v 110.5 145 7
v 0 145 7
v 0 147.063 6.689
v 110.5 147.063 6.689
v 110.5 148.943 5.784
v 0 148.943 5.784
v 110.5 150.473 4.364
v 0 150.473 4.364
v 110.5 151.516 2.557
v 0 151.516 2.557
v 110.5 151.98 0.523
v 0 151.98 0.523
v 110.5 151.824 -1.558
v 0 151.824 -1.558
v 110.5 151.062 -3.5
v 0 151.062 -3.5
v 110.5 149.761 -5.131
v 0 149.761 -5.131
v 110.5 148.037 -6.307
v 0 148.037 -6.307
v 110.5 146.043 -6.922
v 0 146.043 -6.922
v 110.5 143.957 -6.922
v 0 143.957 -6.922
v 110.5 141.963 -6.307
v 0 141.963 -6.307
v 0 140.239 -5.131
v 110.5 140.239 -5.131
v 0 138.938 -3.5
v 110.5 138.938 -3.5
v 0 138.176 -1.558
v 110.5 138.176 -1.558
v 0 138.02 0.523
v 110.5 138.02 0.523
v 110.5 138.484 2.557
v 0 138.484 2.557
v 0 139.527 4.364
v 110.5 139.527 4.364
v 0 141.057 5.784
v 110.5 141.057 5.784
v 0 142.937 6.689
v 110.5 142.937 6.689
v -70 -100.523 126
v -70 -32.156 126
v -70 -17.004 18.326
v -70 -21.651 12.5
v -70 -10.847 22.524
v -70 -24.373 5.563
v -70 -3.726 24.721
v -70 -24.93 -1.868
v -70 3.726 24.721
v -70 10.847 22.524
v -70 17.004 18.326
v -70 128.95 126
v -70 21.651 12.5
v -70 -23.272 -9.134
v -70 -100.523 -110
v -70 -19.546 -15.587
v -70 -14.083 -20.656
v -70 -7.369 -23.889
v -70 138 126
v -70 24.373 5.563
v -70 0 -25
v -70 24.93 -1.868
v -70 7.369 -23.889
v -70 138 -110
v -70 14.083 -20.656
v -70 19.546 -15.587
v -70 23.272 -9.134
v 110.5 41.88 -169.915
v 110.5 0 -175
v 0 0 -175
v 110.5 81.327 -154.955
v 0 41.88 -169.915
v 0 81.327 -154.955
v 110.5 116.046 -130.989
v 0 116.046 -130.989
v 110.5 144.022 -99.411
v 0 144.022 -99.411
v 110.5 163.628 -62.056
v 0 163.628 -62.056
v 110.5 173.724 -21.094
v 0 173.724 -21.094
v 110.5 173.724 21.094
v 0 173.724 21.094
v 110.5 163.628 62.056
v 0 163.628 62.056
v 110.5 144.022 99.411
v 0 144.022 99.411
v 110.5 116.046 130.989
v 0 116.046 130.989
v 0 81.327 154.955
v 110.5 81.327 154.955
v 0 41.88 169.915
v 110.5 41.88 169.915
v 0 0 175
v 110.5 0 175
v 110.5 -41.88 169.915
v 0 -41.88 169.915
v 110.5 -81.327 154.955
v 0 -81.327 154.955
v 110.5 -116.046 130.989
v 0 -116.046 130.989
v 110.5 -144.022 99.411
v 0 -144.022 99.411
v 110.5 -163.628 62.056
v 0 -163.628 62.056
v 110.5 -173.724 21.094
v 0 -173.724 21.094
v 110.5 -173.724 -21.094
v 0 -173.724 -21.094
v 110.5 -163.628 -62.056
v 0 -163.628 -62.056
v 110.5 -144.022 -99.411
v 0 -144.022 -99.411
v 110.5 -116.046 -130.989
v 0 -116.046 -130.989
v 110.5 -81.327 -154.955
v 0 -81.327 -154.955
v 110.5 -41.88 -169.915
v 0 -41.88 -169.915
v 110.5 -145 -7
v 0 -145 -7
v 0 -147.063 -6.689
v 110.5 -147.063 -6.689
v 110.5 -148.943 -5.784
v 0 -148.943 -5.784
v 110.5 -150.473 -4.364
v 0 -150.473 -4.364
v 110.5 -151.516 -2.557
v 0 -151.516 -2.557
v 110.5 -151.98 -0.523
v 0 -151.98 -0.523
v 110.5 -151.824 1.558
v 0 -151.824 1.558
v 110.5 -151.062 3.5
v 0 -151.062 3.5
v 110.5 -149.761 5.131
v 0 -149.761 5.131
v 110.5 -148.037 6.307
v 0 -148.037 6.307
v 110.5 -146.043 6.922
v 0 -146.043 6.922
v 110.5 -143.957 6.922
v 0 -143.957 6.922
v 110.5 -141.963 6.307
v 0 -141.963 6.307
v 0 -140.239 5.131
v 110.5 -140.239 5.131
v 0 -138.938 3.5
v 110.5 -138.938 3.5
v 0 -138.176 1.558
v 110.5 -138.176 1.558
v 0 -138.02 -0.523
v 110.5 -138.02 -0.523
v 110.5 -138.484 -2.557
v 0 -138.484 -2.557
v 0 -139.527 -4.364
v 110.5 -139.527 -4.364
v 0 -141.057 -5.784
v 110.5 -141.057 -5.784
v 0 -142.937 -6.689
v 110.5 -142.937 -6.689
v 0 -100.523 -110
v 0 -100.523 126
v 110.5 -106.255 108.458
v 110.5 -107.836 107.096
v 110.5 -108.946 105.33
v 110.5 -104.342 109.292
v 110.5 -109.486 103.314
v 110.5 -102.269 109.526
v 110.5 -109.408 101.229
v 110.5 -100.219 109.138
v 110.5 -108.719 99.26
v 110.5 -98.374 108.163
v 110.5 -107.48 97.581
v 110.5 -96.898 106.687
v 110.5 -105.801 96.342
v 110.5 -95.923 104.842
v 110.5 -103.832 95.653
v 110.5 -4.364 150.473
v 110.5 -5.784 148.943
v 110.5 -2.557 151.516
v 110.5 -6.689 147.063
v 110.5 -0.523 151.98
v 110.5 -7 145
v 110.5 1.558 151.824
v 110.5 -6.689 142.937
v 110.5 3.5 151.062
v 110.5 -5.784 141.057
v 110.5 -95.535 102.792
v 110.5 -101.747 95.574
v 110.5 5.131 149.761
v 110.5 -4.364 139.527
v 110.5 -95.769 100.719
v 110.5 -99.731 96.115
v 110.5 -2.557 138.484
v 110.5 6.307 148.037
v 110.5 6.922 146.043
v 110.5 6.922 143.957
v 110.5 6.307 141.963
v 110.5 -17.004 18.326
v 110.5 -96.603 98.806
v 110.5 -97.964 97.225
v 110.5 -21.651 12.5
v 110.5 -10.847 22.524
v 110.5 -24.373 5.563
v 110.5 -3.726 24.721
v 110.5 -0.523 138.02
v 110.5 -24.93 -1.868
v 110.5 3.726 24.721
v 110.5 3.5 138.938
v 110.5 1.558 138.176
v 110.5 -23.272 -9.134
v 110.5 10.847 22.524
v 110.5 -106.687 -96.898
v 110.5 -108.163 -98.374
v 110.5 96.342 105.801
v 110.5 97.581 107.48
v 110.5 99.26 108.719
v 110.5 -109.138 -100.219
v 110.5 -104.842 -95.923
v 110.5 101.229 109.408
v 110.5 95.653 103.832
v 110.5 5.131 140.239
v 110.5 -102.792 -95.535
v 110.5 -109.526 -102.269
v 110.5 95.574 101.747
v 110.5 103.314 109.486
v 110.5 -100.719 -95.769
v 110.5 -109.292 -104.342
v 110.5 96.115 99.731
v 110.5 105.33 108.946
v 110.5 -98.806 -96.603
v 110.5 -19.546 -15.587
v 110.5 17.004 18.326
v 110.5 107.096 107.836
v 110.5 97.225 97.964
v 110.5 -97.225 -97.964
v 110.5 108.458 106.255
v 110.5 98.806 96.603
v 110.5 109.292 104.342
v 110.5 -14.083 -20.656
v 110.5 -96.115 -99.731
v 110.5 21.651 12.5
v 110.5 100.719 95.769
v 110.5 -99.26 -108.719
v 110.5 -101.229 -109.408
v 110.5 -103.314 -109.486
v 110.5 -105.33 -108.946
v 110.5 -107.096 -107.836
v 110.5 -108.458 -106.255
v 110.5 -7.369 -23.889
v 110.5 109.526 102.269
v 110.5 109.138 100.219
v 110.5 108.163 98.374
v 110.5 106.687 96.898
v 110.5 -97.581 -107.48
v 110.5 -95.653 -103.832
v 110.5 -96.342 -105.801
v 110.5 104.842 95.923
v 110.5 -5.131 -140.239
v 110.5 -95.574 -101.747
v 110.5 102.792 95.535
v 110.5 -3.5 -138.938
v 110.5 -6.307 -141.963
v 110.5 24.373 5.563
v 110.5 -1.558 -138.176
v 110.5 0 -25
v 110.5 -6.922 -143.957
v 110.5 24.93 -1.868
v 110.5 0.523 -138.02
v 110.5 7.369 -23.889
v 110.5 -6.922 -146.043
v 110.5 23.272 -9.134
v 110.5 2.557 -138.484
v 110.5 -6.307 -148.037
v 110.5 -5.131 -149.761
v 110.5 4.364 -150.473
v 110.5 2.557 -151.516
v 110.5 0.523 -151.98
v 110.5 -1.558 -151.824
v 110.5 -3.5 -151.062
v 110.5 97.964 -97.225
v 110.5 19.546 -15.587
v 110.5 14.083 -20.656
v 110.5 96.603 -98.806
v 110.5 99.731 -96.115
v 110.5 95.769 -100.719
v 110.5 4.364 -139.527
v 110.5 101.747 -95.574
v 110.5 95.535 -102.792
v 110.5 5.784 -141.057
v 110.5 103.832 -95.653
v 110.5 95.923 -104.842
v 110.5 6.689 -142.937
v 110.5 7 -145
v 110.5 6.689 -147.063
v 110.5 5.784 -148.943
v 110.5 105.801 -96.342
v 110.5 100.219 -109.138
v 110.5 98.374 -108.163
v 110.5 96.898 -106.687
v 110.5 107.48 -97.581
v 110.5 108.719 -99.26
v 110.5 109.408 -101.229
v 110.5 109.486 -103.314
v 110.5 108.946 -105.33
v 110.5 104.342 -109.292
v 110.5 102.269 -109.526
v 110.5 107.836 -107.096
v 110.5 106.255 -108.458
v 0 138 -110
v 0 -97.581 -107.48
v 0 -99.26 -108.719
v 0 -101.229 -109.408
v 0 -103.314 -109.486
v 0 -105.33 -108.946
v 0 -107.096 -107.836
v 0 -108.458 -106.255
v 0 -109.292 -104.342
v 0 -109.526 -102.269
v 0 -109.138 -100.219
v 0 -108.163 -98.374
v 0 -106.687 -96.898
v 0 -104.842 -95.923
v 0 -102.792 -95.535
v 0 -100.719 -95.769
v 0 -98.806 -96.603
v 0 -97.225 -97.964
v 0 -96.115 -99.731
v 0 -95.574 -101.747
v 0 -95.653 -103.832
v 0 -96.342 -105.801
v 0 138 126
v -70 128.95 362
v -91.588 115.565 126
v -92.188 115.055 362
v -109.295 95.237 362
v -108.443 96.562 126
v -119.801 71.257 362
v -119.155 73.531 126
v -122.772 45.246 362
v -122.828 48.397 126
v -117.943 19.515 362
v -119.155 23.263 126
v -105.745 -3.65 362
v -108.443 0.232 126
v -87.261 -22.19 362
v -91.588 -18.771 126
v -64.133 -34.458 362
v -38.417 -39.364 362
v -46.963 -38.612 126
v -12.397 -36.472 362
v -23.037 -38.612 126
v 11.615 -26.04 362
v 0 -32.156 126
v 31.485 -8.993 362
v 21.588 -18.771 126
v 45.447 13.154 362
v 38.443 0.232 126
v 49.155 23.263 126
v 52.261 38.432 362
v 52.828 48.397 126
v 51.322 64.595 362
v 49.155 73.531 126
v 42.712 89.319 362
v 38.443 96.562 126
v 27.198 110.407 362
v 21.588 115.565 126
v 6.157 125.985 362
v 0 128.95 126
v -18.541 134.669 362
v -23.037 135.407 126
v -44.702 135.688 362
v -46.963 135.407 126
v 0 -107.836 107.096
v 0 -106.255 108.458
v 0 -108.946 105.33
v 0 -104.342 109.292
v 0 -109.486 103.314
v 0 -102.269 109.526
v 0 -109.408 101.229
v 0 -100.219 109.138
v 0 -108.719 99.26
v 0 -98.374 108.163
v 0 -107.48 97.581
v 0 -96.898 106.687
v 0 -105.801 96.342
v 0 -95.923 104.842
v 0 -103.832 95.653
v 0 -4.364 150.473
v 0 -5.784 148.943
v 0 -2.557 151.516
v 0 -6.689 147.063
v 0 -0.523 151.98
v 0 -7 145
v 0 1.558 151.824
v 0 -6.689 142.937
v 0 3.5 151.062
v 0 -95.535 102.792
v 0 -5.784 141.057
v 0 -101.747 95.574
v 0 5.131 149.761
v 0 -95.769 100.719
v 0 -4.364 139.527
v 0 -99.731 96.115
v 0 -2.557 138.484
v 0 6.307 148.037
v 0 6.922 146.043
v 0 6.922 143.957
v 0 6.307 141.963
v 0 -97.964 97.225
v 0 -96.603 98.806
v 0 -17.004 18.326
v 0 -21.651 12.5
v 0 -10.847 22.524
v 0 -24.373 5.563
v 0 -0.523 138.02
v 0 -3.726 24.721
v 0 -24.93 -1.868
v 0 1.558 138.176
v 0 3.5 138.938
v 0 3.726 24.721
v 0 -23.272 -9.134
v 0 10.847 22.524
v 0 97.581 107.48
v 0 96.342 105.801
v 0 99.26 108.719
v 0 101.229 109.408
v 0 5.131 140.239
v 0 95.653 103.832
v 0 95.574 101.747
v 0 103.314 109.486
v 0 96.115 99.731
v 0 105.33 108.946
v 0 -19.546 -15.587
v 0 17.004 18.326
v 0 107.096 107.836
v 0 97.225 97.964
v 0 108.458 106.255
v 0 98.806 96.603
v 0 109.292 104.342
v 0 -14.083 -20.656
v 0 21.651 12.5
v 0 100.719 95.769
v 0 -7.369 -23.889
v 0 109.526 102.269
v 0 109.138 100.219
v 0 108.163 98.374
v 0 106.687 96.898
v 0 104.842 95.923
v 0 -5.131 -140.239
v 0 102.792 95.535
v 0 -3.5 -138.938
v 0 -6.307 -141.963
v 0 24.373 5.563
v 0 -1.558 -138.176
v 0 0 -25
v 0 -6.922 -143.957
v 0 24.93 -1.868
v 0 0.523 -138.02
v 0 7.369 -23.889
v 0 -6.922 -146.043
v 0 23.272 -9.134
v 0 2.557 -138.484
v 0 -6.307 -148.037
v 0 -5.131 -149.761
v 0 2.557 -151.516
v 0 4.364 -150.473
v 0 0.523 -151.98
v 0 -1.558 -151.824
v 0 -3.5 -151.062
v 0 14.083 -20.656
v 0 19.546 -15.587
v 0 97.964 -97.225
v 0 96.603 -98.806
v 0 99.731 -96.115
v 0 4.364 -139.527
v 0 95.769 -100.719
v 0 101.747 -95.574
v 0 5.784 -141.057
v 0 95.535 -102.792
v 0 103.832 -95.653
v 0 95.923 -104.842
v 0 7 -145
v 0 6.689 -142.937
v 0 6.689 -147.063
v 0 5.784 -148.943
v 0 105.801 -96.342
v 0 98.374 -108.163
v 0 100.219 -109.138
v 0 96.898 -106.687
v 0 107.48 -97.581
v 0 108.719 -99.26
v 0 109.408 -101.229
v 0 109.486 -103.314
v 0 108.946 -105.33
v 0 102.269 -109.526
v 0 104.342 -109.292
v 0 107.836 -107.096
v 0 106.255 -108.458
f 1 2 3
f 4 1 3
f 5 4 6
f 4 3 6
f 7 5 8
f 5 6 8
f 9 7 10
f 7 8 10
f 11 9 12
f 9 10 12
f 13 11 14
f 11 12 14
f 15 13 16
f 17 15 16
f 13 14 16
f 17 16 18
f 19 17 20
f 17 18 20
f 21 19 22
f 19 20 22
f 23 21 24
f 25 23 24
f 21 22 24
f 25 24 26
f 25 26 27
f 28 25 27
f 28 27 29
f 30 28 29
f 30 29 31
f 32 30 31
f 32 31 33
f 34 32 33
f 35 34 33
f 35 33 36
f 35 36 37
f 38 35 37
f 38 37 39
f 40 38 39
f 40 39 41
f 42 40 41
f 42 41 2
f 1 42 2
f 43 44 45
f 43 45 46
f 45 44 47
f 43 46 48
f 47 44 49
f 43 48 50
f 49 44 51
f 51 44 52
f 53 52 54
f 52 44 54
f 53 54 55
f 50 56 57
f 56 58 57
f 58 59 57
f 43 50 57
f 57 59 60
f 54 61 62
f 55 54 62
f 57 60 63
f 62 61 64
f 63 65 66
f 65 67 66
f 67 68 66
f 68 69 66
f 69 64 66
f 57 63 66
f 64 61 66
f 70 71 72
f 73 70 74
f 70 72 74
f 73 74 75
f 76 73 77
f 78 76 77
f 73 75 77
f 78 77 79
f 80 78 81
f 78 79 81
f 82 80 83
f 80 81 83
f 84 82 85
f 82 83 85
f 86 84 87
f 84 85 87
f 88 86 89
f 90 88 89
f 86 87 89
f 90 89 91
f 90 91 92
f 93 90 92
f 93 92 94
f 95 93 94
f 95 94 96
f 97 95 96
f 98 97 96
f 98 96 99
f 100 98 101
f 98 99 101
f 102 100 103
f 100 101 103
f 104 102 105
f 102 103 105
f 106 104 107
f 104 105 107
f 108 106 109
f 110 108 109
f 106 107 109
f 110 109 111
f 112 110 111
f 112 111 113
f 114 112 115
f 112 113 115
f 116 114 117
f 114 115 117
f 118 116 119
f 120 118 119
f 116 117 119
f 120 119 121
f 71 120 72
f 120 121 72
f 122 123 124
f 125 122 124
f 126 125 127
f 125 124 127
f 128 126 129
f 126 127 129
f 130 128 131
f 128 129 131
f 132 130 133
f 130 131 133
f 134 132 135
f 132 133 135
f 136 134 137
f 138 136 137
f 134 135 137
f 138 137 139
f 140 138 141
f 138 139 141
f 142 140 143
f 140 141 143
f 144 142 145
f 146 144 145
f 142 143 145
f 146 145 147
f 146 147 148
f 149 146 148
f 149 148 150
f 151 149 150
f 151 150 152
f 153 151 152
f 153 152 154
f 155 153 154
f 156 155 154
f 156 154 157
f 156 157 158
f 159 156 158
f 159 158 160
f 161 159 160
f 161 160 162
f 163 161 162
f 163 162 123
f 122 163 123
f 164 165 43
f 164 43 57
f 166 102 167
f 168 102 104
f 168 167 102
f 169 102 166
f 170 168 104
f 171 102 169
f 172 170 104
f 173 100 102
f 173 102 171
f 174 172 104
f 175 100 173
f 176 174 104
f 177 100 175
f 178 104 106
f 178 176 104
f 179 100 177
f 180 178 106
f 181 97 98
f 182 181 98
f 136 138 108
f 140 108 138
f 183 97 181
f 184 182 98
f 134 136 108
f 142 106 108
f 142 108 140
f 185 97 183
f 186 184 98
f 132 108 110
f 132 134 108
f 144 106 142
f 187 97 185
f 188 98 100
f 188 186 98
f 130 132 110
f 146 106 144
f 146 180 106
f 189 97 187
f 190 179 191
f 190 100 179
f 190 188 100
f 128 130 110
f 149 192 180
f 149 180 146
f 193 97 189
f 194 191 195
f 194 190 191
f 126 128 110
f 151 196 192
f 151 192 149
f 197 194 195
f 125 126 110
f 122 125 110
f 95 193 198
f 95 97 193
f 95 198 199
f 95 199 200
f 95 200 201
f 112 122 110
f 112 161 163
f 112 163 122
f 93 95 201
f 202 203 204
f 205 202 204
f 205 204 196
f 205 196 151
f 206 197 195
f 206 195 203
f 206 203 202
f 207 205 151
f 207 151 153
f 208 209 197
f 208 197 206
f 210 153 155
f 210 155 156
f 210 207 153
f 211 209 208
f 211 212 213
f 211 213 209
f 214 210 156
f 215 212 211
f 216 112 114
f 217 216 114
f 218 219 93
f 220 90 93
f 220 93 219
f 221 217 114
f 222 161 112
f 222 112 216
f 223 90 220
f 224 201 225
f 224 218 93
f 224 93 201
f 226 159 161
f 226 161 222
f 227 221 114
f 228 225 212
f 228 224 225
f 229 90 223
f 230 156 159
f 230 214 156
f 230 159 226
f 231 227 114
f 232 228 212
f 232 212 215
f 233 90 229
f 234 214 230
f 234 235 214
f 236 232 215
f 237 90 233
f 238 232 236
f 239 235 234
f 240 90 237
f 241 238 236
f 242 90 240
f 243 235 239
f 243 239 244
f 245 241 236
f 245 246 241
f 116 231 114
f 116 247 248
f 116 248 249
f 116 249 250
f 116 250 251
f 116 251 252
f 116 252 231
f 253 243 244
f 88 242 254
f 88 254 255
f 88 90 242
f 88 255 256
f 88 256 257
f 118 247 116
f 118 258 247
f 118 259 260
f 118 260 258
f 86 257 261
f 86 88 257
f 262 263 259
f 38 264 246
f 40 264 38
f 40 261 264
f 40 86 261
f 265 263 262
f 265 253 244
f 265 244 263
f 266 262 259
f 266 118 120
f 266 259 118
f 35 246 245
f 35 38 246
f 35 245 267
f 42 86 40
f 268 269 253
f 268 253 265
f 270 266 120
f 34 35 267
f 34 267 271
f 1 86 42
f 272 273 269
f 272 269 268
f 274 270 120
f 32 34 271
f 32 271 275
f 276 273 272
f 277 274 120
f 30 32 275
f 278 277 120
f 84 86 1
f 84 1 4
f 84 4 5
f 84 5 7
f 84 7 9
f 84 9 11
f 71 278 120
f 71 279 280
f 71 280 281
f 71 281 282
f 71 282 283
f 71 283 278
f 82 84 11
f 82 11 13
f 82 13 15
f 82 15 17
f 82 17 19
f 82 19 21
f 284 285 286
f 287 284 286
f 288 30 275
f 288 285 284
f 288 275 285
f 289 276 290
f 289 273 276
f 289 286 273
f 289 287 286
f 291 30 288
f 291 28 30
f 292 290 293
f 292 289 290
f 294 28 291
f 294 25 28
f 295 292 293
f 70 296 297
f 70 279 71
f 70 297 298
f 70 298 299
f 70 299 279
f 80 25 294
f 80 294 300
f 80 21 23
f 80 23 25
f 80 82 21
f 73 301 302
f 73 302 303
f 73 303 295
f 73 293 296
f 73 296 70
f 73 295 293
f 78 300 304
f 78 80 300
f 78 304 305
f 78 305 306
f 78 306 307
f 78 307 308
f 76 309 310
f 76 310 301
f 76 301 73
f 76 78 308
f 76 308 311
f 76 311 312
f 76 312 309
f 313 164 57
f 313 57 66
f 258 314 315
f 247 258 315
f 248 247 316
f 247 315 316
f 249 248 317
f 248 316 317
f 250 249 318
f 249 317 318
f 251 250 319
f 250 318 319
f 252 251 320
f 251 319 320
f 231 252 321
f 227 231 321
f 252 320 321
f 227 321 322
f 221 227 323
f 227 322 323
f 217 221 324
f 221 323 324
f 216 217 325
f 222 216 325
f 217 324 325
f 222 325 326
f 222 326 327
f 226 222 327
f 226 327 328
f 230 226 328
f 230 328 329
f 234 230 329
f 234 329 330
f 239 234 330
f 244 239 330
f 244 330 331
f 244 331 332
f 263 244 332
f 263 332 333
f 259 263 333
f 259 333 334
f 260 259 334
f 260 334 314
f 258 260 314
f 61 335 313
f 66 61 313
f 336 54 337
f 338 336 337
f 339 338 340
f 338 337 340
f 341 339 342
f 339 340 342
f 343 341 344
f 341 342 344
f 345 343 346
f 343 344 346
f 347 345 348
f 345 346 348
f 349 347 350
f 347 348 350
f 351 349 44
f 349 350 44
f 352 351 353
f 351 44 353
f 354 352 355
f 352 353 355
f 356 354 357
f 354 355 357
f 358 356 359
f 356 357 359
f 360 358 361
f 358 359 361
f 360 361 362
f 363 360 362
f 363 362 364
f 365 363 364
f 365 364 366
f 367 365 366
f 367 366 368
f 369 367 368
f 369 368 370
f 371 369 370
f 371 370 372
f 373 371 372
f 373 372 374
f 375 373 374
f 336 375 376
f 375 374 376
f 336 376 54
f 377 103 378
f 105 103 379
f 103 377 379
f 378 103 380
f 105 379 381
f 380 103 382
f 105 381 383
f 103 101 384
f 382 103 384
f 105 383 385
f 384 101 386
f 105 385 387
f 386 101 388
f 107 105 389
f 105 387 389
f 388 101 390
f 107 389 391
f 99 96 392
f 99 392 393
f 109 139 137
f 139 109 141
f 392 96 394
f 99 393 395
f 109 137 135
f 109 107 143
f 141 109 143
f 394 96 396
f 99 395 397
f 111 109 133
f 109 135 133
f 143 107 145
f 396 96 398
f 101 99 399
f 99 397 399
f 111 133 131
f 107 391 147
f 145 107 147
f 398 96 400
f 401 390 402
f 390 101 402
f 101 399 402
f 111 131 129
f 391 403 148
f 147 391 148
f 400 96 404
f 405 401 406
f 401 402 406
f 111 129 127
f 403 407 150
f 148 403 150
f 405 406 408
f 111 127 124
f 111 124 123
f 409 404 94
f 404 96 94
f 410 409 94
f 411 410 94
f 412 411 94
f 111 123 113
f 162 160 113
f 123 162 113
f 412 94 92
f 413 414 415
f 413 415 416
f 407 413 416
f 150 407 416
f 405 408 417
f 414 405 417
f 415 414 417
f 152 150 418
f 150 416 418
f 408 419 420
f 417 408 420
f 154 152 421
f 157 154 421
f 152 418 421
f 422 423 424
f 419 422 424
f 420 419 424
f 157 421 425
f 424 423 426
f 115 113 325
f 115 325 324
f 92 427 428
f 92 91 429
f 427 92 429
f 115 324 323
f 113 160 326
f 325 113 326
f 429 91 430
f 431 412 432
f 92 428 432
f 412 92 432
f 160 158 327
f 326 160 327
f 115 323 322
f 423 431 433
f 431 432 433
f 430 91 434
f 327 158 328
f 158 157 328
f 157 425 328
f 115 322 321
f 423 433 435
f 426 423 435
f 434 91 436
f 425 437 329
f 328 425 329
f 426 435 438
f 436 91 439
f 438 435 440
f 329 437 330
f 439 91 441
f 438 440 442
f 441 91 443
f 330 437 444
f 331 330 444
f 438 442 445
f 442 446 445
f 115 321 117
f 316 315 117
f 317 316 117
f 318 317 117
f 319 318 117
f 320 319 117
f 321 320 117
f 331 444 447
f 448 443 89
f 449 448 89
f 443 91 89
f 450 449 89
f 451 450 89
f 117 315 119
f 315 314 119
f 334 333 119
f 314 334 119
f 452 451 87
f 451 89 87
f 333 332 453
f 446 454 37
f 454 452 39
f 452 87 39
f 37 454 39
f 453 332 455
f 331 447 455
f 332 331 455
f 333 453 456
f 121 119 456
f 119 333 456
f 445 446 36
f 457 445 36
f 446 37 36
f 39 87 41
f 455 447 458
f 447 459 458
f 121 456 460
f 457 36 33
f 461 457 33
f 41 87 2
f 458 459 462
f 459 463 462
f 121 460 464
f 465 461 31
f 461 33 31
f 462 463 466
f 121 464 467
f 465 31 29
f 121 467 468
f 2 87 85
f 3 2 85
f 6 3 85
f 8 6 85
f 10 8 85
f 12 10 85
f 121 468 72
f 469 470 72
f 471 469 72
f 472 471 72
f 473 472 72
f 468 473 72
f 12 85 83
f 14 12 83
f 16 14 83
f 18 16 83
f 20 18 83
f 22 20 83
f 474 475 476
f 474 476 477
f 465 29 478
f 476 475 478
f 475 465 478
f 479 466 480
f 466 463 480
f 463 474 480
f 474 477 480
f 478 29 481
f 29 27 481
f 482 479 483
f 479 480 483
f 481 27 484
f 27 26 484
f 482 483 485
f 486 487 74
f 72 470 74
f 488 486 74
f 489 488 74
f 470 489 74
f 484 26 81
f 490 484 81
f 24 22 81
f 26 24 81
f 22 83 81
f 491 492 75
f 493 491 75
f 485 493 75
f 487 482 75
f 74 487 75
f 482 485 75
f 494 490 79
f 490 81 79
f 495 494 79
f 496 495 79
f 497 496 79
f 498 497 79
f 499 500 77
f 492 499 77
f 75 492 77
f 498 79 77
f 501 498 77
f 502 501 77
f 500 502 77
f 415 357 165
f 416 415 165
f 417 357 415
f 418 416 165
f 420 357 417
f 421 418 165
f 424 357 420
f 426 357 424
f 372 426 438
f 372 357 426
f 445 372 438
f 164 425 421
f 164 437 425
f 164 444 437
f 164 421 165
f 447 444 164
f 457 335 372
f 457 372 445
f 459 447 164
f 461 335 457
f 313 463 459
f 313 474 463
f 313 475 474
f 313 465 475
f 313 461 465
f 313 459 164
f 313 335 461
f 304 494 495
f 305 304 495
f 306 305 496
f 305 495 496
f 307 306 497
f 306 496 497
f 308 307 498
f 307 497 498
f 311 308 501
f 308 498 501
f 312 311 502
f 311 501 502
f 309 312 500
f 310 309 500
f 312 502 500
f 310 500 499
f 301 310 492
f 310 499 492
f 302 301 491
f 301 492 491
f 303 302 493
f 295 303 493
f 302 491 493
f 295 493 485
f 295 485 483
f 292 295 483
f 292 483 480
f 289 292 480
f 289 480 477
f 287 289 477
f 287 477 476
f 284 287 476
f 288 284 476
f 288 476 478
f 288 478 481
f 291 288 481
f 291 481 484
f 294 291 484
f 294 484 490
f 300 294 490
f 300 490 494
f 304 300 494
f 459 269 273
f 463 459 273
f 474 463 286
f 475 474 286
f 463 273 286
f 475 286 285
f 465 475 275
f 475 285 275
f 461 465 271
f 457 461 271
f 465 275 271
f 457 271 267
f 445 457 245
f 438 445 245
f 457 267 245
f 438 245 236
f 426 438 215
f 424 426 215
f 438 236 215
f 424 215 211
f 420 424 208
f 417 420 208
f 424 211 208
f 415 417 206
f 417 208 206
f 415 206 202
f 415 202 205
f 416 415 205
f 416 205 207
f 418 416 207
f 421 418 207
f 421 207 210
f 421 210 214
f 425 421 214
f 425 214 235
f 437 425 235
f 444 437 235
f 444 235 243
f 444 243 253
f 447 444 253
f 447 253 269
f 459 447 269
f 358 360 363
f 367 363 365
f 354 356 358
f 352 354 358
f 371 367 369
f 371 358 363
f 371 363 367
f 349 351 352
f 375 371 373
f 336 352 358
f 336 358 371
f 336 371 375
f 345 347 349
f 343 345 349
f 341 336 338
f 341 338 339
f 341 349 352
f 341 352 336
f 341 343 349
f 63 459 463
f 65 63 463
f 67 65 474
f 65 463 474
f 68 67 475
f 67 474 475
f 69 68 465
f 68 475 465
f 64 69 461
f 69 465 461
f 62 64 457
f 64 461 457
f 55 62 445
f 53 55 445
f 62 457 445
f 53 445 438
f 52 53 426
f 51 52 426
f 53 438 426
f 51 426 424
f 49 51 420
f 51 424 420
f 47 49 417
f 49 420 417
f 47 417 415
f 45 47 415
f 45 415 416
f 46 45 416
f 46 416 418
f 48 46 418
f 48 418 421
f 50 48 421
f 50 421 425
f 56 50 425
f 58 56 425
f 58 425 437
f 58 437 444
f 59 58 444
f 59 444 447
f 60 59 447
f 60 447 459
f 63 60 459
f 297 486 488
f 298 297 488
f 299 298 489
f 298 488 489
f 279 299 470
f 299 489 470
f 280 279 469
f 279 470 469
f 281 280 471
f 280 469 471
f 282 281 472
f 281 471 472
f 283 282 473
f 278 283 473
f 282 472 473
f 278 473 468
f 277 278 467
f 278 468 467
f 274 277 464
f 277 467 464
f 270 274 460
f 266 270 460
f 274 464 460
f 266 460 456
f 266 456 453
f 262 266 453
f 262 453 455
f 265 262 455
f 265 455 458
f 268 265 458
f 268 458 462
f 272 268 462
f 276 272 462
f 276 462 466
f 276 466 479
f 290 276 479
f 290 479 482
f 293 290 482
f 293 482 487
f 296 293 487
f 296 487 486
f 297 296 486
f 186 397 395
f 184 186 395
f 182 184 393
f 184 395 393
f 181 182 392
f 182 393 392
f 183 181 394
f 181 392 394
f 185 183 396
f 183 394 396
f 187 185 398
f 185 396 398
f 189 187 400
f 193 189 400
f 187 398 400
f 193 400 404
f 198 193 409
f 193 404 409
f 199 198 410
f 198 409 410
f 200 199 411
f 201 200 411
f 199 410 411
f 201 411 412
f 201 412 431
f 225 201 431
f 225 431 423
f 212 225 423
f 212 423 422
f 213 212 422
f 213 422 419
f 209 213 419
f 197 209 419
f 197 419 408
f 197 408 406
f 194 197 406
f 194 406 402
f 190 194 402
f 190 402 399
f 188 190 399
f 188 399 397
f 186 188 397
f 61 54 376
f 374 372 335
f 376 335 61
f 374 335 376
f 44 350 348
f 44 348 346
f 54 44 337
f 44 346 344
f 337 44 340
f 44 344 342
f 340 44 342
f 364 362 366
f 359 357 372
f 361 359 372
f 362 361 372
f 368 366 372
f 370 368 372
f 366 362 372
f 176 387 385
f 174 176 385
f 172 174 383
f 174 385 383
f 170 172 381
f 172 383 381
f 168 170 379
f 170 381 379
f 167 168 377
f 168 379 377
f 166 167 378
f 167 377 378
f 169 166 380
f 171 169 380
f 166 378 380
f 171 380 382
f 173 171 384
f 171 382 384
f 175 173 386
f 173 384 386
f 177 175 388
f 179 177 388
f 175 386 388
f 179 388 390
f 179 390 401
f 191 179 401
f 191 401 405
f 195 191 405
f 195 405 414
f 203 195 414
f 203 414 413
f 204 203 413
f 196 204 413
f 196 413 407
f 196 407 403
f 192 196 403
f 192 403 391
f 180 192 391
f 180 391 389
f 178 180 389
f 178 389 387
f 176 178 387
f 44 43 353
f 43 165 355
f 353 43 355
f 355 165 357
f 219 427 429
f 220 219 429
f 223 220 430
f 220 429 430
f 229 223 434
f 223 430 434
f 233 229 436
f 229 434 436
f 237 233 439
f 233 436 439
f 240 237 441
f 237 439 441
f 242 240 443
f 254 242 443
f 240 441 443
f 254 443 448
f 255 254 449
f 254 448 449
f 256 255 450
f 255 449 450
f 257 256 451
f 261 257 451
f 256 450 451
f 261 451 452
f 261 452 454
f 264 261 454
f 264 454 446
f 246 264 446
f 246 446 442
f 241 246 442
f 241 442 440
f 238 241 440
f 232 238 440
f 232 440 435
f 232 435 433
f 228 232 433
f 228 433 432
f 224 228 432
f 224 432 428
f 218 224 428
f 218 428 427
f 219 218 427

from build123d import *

# Parameters (mm, degrees)
SKETCH1_R           = 175
BOSS_EXTRUDE1_DEPTH = 110.5
SKETCH2_R           = 7
CUT_EXTRUDE1_DEPTH  = 272.035514278
CIRPATTERN1_COUNT   = 8
SKETCH4_W           = 236
SKETCH4_H           = 238.523478567
BOSS_EXTRUDE2_DEPTH = 70
SKETCH5_R           = 87.828068046
BOSS_EXTRUDE3_DEPTH = 236
SKETCH6_R           = 25
CUT_EXTRUDE2_DEPTH  = 465.877389575


with BuildPart() as part:
    # Sketch1 → Boss-Extrude1 (new body)
    with BuildSketch(Plane(origin=(0, 0, 0), x_dir=(0, 0, -1), z_dir=(1, 0, 0))):
        Circle(SKETCH1_R)
    extrude(amount=BOSS_EXTRUDE1_DEPTH)

    # Sketch2 → Cut-Extrude1 (cut, through all)
    with BuildSketch(Plane.ZY):
        with Locations((0, 145)):
            Circle(SKETCH2_R)
    cut_extrude1 = extrude(amount=-CUT_EXTRUDE1_DEPTH, mode=Mode.SUBTRACT)

    # CirPattern1: Cut-Extrude1 ×8 about axis
    cirpattern1_axis = Axis((0, 0, 0), (1, 0, 0))
    for i in range(1, CIRPATTERN1_COUNT):
        add(cut_extrude1.rotate(cirpattern1_axis, i * 360 / CIRPATTERN1_COUNT), mode=Mode.SUBTRACT)


with BuildPart() as body_2:
    # Sketch4 → Boss-Extrude2 (new body)
    with BuildSketch(Plane(origin=(0, 0, 0), x_dir=(0, 0, -1), z_dir=(1, 0, 0))):
        with Locations((-8, 18.738260716)):
            Rectangle(SKETCH4_W, SKETCH4_H)
    extrude(amount=-BOSS_EXTRUDE2_DEPTH)

    # Sketch5 → Boss-Extrude3 (add)
    with BuildSketch(Plane.XY.offset(126)):
        with Locations(Location((-35, 48.397201252, 0), (0, 0, 113.484805898))):
            Circle(SKETCH5_R)
    extrude(amount=BOSS_EXTRUDE3_DEPTH)


with BuildPart() as cut_extrude2_tool:
    # Sketch6 → Cut-Extrude2 (new, through all)
    with BuildSketch(Plane(origin=(110.5, 0, 0), x_dir=(0, 0, -1), z_dir=(1, 0, 0))):
        Circle(SKETCH6_R)
    extrude(amount=-CUT_EXTRUDE2_DEPTH)


with BuildPart() as part_1:
    add(part.part)

    # Cut-Extrude2: cut by cut_extrude2_tool
    add(cut_extrude2_tool.part, mode=Mode.SUBTRACT)


with BuildPart() as body_2_1:
    add(body_2.part)

    # Cut-Extrude2: cut by cut_extrude2_tool
    add(cut_extrude2_tool.part, mode=Mode.SUBTRACT)


solid = Compound([part_1.part, body_2_1.part])
